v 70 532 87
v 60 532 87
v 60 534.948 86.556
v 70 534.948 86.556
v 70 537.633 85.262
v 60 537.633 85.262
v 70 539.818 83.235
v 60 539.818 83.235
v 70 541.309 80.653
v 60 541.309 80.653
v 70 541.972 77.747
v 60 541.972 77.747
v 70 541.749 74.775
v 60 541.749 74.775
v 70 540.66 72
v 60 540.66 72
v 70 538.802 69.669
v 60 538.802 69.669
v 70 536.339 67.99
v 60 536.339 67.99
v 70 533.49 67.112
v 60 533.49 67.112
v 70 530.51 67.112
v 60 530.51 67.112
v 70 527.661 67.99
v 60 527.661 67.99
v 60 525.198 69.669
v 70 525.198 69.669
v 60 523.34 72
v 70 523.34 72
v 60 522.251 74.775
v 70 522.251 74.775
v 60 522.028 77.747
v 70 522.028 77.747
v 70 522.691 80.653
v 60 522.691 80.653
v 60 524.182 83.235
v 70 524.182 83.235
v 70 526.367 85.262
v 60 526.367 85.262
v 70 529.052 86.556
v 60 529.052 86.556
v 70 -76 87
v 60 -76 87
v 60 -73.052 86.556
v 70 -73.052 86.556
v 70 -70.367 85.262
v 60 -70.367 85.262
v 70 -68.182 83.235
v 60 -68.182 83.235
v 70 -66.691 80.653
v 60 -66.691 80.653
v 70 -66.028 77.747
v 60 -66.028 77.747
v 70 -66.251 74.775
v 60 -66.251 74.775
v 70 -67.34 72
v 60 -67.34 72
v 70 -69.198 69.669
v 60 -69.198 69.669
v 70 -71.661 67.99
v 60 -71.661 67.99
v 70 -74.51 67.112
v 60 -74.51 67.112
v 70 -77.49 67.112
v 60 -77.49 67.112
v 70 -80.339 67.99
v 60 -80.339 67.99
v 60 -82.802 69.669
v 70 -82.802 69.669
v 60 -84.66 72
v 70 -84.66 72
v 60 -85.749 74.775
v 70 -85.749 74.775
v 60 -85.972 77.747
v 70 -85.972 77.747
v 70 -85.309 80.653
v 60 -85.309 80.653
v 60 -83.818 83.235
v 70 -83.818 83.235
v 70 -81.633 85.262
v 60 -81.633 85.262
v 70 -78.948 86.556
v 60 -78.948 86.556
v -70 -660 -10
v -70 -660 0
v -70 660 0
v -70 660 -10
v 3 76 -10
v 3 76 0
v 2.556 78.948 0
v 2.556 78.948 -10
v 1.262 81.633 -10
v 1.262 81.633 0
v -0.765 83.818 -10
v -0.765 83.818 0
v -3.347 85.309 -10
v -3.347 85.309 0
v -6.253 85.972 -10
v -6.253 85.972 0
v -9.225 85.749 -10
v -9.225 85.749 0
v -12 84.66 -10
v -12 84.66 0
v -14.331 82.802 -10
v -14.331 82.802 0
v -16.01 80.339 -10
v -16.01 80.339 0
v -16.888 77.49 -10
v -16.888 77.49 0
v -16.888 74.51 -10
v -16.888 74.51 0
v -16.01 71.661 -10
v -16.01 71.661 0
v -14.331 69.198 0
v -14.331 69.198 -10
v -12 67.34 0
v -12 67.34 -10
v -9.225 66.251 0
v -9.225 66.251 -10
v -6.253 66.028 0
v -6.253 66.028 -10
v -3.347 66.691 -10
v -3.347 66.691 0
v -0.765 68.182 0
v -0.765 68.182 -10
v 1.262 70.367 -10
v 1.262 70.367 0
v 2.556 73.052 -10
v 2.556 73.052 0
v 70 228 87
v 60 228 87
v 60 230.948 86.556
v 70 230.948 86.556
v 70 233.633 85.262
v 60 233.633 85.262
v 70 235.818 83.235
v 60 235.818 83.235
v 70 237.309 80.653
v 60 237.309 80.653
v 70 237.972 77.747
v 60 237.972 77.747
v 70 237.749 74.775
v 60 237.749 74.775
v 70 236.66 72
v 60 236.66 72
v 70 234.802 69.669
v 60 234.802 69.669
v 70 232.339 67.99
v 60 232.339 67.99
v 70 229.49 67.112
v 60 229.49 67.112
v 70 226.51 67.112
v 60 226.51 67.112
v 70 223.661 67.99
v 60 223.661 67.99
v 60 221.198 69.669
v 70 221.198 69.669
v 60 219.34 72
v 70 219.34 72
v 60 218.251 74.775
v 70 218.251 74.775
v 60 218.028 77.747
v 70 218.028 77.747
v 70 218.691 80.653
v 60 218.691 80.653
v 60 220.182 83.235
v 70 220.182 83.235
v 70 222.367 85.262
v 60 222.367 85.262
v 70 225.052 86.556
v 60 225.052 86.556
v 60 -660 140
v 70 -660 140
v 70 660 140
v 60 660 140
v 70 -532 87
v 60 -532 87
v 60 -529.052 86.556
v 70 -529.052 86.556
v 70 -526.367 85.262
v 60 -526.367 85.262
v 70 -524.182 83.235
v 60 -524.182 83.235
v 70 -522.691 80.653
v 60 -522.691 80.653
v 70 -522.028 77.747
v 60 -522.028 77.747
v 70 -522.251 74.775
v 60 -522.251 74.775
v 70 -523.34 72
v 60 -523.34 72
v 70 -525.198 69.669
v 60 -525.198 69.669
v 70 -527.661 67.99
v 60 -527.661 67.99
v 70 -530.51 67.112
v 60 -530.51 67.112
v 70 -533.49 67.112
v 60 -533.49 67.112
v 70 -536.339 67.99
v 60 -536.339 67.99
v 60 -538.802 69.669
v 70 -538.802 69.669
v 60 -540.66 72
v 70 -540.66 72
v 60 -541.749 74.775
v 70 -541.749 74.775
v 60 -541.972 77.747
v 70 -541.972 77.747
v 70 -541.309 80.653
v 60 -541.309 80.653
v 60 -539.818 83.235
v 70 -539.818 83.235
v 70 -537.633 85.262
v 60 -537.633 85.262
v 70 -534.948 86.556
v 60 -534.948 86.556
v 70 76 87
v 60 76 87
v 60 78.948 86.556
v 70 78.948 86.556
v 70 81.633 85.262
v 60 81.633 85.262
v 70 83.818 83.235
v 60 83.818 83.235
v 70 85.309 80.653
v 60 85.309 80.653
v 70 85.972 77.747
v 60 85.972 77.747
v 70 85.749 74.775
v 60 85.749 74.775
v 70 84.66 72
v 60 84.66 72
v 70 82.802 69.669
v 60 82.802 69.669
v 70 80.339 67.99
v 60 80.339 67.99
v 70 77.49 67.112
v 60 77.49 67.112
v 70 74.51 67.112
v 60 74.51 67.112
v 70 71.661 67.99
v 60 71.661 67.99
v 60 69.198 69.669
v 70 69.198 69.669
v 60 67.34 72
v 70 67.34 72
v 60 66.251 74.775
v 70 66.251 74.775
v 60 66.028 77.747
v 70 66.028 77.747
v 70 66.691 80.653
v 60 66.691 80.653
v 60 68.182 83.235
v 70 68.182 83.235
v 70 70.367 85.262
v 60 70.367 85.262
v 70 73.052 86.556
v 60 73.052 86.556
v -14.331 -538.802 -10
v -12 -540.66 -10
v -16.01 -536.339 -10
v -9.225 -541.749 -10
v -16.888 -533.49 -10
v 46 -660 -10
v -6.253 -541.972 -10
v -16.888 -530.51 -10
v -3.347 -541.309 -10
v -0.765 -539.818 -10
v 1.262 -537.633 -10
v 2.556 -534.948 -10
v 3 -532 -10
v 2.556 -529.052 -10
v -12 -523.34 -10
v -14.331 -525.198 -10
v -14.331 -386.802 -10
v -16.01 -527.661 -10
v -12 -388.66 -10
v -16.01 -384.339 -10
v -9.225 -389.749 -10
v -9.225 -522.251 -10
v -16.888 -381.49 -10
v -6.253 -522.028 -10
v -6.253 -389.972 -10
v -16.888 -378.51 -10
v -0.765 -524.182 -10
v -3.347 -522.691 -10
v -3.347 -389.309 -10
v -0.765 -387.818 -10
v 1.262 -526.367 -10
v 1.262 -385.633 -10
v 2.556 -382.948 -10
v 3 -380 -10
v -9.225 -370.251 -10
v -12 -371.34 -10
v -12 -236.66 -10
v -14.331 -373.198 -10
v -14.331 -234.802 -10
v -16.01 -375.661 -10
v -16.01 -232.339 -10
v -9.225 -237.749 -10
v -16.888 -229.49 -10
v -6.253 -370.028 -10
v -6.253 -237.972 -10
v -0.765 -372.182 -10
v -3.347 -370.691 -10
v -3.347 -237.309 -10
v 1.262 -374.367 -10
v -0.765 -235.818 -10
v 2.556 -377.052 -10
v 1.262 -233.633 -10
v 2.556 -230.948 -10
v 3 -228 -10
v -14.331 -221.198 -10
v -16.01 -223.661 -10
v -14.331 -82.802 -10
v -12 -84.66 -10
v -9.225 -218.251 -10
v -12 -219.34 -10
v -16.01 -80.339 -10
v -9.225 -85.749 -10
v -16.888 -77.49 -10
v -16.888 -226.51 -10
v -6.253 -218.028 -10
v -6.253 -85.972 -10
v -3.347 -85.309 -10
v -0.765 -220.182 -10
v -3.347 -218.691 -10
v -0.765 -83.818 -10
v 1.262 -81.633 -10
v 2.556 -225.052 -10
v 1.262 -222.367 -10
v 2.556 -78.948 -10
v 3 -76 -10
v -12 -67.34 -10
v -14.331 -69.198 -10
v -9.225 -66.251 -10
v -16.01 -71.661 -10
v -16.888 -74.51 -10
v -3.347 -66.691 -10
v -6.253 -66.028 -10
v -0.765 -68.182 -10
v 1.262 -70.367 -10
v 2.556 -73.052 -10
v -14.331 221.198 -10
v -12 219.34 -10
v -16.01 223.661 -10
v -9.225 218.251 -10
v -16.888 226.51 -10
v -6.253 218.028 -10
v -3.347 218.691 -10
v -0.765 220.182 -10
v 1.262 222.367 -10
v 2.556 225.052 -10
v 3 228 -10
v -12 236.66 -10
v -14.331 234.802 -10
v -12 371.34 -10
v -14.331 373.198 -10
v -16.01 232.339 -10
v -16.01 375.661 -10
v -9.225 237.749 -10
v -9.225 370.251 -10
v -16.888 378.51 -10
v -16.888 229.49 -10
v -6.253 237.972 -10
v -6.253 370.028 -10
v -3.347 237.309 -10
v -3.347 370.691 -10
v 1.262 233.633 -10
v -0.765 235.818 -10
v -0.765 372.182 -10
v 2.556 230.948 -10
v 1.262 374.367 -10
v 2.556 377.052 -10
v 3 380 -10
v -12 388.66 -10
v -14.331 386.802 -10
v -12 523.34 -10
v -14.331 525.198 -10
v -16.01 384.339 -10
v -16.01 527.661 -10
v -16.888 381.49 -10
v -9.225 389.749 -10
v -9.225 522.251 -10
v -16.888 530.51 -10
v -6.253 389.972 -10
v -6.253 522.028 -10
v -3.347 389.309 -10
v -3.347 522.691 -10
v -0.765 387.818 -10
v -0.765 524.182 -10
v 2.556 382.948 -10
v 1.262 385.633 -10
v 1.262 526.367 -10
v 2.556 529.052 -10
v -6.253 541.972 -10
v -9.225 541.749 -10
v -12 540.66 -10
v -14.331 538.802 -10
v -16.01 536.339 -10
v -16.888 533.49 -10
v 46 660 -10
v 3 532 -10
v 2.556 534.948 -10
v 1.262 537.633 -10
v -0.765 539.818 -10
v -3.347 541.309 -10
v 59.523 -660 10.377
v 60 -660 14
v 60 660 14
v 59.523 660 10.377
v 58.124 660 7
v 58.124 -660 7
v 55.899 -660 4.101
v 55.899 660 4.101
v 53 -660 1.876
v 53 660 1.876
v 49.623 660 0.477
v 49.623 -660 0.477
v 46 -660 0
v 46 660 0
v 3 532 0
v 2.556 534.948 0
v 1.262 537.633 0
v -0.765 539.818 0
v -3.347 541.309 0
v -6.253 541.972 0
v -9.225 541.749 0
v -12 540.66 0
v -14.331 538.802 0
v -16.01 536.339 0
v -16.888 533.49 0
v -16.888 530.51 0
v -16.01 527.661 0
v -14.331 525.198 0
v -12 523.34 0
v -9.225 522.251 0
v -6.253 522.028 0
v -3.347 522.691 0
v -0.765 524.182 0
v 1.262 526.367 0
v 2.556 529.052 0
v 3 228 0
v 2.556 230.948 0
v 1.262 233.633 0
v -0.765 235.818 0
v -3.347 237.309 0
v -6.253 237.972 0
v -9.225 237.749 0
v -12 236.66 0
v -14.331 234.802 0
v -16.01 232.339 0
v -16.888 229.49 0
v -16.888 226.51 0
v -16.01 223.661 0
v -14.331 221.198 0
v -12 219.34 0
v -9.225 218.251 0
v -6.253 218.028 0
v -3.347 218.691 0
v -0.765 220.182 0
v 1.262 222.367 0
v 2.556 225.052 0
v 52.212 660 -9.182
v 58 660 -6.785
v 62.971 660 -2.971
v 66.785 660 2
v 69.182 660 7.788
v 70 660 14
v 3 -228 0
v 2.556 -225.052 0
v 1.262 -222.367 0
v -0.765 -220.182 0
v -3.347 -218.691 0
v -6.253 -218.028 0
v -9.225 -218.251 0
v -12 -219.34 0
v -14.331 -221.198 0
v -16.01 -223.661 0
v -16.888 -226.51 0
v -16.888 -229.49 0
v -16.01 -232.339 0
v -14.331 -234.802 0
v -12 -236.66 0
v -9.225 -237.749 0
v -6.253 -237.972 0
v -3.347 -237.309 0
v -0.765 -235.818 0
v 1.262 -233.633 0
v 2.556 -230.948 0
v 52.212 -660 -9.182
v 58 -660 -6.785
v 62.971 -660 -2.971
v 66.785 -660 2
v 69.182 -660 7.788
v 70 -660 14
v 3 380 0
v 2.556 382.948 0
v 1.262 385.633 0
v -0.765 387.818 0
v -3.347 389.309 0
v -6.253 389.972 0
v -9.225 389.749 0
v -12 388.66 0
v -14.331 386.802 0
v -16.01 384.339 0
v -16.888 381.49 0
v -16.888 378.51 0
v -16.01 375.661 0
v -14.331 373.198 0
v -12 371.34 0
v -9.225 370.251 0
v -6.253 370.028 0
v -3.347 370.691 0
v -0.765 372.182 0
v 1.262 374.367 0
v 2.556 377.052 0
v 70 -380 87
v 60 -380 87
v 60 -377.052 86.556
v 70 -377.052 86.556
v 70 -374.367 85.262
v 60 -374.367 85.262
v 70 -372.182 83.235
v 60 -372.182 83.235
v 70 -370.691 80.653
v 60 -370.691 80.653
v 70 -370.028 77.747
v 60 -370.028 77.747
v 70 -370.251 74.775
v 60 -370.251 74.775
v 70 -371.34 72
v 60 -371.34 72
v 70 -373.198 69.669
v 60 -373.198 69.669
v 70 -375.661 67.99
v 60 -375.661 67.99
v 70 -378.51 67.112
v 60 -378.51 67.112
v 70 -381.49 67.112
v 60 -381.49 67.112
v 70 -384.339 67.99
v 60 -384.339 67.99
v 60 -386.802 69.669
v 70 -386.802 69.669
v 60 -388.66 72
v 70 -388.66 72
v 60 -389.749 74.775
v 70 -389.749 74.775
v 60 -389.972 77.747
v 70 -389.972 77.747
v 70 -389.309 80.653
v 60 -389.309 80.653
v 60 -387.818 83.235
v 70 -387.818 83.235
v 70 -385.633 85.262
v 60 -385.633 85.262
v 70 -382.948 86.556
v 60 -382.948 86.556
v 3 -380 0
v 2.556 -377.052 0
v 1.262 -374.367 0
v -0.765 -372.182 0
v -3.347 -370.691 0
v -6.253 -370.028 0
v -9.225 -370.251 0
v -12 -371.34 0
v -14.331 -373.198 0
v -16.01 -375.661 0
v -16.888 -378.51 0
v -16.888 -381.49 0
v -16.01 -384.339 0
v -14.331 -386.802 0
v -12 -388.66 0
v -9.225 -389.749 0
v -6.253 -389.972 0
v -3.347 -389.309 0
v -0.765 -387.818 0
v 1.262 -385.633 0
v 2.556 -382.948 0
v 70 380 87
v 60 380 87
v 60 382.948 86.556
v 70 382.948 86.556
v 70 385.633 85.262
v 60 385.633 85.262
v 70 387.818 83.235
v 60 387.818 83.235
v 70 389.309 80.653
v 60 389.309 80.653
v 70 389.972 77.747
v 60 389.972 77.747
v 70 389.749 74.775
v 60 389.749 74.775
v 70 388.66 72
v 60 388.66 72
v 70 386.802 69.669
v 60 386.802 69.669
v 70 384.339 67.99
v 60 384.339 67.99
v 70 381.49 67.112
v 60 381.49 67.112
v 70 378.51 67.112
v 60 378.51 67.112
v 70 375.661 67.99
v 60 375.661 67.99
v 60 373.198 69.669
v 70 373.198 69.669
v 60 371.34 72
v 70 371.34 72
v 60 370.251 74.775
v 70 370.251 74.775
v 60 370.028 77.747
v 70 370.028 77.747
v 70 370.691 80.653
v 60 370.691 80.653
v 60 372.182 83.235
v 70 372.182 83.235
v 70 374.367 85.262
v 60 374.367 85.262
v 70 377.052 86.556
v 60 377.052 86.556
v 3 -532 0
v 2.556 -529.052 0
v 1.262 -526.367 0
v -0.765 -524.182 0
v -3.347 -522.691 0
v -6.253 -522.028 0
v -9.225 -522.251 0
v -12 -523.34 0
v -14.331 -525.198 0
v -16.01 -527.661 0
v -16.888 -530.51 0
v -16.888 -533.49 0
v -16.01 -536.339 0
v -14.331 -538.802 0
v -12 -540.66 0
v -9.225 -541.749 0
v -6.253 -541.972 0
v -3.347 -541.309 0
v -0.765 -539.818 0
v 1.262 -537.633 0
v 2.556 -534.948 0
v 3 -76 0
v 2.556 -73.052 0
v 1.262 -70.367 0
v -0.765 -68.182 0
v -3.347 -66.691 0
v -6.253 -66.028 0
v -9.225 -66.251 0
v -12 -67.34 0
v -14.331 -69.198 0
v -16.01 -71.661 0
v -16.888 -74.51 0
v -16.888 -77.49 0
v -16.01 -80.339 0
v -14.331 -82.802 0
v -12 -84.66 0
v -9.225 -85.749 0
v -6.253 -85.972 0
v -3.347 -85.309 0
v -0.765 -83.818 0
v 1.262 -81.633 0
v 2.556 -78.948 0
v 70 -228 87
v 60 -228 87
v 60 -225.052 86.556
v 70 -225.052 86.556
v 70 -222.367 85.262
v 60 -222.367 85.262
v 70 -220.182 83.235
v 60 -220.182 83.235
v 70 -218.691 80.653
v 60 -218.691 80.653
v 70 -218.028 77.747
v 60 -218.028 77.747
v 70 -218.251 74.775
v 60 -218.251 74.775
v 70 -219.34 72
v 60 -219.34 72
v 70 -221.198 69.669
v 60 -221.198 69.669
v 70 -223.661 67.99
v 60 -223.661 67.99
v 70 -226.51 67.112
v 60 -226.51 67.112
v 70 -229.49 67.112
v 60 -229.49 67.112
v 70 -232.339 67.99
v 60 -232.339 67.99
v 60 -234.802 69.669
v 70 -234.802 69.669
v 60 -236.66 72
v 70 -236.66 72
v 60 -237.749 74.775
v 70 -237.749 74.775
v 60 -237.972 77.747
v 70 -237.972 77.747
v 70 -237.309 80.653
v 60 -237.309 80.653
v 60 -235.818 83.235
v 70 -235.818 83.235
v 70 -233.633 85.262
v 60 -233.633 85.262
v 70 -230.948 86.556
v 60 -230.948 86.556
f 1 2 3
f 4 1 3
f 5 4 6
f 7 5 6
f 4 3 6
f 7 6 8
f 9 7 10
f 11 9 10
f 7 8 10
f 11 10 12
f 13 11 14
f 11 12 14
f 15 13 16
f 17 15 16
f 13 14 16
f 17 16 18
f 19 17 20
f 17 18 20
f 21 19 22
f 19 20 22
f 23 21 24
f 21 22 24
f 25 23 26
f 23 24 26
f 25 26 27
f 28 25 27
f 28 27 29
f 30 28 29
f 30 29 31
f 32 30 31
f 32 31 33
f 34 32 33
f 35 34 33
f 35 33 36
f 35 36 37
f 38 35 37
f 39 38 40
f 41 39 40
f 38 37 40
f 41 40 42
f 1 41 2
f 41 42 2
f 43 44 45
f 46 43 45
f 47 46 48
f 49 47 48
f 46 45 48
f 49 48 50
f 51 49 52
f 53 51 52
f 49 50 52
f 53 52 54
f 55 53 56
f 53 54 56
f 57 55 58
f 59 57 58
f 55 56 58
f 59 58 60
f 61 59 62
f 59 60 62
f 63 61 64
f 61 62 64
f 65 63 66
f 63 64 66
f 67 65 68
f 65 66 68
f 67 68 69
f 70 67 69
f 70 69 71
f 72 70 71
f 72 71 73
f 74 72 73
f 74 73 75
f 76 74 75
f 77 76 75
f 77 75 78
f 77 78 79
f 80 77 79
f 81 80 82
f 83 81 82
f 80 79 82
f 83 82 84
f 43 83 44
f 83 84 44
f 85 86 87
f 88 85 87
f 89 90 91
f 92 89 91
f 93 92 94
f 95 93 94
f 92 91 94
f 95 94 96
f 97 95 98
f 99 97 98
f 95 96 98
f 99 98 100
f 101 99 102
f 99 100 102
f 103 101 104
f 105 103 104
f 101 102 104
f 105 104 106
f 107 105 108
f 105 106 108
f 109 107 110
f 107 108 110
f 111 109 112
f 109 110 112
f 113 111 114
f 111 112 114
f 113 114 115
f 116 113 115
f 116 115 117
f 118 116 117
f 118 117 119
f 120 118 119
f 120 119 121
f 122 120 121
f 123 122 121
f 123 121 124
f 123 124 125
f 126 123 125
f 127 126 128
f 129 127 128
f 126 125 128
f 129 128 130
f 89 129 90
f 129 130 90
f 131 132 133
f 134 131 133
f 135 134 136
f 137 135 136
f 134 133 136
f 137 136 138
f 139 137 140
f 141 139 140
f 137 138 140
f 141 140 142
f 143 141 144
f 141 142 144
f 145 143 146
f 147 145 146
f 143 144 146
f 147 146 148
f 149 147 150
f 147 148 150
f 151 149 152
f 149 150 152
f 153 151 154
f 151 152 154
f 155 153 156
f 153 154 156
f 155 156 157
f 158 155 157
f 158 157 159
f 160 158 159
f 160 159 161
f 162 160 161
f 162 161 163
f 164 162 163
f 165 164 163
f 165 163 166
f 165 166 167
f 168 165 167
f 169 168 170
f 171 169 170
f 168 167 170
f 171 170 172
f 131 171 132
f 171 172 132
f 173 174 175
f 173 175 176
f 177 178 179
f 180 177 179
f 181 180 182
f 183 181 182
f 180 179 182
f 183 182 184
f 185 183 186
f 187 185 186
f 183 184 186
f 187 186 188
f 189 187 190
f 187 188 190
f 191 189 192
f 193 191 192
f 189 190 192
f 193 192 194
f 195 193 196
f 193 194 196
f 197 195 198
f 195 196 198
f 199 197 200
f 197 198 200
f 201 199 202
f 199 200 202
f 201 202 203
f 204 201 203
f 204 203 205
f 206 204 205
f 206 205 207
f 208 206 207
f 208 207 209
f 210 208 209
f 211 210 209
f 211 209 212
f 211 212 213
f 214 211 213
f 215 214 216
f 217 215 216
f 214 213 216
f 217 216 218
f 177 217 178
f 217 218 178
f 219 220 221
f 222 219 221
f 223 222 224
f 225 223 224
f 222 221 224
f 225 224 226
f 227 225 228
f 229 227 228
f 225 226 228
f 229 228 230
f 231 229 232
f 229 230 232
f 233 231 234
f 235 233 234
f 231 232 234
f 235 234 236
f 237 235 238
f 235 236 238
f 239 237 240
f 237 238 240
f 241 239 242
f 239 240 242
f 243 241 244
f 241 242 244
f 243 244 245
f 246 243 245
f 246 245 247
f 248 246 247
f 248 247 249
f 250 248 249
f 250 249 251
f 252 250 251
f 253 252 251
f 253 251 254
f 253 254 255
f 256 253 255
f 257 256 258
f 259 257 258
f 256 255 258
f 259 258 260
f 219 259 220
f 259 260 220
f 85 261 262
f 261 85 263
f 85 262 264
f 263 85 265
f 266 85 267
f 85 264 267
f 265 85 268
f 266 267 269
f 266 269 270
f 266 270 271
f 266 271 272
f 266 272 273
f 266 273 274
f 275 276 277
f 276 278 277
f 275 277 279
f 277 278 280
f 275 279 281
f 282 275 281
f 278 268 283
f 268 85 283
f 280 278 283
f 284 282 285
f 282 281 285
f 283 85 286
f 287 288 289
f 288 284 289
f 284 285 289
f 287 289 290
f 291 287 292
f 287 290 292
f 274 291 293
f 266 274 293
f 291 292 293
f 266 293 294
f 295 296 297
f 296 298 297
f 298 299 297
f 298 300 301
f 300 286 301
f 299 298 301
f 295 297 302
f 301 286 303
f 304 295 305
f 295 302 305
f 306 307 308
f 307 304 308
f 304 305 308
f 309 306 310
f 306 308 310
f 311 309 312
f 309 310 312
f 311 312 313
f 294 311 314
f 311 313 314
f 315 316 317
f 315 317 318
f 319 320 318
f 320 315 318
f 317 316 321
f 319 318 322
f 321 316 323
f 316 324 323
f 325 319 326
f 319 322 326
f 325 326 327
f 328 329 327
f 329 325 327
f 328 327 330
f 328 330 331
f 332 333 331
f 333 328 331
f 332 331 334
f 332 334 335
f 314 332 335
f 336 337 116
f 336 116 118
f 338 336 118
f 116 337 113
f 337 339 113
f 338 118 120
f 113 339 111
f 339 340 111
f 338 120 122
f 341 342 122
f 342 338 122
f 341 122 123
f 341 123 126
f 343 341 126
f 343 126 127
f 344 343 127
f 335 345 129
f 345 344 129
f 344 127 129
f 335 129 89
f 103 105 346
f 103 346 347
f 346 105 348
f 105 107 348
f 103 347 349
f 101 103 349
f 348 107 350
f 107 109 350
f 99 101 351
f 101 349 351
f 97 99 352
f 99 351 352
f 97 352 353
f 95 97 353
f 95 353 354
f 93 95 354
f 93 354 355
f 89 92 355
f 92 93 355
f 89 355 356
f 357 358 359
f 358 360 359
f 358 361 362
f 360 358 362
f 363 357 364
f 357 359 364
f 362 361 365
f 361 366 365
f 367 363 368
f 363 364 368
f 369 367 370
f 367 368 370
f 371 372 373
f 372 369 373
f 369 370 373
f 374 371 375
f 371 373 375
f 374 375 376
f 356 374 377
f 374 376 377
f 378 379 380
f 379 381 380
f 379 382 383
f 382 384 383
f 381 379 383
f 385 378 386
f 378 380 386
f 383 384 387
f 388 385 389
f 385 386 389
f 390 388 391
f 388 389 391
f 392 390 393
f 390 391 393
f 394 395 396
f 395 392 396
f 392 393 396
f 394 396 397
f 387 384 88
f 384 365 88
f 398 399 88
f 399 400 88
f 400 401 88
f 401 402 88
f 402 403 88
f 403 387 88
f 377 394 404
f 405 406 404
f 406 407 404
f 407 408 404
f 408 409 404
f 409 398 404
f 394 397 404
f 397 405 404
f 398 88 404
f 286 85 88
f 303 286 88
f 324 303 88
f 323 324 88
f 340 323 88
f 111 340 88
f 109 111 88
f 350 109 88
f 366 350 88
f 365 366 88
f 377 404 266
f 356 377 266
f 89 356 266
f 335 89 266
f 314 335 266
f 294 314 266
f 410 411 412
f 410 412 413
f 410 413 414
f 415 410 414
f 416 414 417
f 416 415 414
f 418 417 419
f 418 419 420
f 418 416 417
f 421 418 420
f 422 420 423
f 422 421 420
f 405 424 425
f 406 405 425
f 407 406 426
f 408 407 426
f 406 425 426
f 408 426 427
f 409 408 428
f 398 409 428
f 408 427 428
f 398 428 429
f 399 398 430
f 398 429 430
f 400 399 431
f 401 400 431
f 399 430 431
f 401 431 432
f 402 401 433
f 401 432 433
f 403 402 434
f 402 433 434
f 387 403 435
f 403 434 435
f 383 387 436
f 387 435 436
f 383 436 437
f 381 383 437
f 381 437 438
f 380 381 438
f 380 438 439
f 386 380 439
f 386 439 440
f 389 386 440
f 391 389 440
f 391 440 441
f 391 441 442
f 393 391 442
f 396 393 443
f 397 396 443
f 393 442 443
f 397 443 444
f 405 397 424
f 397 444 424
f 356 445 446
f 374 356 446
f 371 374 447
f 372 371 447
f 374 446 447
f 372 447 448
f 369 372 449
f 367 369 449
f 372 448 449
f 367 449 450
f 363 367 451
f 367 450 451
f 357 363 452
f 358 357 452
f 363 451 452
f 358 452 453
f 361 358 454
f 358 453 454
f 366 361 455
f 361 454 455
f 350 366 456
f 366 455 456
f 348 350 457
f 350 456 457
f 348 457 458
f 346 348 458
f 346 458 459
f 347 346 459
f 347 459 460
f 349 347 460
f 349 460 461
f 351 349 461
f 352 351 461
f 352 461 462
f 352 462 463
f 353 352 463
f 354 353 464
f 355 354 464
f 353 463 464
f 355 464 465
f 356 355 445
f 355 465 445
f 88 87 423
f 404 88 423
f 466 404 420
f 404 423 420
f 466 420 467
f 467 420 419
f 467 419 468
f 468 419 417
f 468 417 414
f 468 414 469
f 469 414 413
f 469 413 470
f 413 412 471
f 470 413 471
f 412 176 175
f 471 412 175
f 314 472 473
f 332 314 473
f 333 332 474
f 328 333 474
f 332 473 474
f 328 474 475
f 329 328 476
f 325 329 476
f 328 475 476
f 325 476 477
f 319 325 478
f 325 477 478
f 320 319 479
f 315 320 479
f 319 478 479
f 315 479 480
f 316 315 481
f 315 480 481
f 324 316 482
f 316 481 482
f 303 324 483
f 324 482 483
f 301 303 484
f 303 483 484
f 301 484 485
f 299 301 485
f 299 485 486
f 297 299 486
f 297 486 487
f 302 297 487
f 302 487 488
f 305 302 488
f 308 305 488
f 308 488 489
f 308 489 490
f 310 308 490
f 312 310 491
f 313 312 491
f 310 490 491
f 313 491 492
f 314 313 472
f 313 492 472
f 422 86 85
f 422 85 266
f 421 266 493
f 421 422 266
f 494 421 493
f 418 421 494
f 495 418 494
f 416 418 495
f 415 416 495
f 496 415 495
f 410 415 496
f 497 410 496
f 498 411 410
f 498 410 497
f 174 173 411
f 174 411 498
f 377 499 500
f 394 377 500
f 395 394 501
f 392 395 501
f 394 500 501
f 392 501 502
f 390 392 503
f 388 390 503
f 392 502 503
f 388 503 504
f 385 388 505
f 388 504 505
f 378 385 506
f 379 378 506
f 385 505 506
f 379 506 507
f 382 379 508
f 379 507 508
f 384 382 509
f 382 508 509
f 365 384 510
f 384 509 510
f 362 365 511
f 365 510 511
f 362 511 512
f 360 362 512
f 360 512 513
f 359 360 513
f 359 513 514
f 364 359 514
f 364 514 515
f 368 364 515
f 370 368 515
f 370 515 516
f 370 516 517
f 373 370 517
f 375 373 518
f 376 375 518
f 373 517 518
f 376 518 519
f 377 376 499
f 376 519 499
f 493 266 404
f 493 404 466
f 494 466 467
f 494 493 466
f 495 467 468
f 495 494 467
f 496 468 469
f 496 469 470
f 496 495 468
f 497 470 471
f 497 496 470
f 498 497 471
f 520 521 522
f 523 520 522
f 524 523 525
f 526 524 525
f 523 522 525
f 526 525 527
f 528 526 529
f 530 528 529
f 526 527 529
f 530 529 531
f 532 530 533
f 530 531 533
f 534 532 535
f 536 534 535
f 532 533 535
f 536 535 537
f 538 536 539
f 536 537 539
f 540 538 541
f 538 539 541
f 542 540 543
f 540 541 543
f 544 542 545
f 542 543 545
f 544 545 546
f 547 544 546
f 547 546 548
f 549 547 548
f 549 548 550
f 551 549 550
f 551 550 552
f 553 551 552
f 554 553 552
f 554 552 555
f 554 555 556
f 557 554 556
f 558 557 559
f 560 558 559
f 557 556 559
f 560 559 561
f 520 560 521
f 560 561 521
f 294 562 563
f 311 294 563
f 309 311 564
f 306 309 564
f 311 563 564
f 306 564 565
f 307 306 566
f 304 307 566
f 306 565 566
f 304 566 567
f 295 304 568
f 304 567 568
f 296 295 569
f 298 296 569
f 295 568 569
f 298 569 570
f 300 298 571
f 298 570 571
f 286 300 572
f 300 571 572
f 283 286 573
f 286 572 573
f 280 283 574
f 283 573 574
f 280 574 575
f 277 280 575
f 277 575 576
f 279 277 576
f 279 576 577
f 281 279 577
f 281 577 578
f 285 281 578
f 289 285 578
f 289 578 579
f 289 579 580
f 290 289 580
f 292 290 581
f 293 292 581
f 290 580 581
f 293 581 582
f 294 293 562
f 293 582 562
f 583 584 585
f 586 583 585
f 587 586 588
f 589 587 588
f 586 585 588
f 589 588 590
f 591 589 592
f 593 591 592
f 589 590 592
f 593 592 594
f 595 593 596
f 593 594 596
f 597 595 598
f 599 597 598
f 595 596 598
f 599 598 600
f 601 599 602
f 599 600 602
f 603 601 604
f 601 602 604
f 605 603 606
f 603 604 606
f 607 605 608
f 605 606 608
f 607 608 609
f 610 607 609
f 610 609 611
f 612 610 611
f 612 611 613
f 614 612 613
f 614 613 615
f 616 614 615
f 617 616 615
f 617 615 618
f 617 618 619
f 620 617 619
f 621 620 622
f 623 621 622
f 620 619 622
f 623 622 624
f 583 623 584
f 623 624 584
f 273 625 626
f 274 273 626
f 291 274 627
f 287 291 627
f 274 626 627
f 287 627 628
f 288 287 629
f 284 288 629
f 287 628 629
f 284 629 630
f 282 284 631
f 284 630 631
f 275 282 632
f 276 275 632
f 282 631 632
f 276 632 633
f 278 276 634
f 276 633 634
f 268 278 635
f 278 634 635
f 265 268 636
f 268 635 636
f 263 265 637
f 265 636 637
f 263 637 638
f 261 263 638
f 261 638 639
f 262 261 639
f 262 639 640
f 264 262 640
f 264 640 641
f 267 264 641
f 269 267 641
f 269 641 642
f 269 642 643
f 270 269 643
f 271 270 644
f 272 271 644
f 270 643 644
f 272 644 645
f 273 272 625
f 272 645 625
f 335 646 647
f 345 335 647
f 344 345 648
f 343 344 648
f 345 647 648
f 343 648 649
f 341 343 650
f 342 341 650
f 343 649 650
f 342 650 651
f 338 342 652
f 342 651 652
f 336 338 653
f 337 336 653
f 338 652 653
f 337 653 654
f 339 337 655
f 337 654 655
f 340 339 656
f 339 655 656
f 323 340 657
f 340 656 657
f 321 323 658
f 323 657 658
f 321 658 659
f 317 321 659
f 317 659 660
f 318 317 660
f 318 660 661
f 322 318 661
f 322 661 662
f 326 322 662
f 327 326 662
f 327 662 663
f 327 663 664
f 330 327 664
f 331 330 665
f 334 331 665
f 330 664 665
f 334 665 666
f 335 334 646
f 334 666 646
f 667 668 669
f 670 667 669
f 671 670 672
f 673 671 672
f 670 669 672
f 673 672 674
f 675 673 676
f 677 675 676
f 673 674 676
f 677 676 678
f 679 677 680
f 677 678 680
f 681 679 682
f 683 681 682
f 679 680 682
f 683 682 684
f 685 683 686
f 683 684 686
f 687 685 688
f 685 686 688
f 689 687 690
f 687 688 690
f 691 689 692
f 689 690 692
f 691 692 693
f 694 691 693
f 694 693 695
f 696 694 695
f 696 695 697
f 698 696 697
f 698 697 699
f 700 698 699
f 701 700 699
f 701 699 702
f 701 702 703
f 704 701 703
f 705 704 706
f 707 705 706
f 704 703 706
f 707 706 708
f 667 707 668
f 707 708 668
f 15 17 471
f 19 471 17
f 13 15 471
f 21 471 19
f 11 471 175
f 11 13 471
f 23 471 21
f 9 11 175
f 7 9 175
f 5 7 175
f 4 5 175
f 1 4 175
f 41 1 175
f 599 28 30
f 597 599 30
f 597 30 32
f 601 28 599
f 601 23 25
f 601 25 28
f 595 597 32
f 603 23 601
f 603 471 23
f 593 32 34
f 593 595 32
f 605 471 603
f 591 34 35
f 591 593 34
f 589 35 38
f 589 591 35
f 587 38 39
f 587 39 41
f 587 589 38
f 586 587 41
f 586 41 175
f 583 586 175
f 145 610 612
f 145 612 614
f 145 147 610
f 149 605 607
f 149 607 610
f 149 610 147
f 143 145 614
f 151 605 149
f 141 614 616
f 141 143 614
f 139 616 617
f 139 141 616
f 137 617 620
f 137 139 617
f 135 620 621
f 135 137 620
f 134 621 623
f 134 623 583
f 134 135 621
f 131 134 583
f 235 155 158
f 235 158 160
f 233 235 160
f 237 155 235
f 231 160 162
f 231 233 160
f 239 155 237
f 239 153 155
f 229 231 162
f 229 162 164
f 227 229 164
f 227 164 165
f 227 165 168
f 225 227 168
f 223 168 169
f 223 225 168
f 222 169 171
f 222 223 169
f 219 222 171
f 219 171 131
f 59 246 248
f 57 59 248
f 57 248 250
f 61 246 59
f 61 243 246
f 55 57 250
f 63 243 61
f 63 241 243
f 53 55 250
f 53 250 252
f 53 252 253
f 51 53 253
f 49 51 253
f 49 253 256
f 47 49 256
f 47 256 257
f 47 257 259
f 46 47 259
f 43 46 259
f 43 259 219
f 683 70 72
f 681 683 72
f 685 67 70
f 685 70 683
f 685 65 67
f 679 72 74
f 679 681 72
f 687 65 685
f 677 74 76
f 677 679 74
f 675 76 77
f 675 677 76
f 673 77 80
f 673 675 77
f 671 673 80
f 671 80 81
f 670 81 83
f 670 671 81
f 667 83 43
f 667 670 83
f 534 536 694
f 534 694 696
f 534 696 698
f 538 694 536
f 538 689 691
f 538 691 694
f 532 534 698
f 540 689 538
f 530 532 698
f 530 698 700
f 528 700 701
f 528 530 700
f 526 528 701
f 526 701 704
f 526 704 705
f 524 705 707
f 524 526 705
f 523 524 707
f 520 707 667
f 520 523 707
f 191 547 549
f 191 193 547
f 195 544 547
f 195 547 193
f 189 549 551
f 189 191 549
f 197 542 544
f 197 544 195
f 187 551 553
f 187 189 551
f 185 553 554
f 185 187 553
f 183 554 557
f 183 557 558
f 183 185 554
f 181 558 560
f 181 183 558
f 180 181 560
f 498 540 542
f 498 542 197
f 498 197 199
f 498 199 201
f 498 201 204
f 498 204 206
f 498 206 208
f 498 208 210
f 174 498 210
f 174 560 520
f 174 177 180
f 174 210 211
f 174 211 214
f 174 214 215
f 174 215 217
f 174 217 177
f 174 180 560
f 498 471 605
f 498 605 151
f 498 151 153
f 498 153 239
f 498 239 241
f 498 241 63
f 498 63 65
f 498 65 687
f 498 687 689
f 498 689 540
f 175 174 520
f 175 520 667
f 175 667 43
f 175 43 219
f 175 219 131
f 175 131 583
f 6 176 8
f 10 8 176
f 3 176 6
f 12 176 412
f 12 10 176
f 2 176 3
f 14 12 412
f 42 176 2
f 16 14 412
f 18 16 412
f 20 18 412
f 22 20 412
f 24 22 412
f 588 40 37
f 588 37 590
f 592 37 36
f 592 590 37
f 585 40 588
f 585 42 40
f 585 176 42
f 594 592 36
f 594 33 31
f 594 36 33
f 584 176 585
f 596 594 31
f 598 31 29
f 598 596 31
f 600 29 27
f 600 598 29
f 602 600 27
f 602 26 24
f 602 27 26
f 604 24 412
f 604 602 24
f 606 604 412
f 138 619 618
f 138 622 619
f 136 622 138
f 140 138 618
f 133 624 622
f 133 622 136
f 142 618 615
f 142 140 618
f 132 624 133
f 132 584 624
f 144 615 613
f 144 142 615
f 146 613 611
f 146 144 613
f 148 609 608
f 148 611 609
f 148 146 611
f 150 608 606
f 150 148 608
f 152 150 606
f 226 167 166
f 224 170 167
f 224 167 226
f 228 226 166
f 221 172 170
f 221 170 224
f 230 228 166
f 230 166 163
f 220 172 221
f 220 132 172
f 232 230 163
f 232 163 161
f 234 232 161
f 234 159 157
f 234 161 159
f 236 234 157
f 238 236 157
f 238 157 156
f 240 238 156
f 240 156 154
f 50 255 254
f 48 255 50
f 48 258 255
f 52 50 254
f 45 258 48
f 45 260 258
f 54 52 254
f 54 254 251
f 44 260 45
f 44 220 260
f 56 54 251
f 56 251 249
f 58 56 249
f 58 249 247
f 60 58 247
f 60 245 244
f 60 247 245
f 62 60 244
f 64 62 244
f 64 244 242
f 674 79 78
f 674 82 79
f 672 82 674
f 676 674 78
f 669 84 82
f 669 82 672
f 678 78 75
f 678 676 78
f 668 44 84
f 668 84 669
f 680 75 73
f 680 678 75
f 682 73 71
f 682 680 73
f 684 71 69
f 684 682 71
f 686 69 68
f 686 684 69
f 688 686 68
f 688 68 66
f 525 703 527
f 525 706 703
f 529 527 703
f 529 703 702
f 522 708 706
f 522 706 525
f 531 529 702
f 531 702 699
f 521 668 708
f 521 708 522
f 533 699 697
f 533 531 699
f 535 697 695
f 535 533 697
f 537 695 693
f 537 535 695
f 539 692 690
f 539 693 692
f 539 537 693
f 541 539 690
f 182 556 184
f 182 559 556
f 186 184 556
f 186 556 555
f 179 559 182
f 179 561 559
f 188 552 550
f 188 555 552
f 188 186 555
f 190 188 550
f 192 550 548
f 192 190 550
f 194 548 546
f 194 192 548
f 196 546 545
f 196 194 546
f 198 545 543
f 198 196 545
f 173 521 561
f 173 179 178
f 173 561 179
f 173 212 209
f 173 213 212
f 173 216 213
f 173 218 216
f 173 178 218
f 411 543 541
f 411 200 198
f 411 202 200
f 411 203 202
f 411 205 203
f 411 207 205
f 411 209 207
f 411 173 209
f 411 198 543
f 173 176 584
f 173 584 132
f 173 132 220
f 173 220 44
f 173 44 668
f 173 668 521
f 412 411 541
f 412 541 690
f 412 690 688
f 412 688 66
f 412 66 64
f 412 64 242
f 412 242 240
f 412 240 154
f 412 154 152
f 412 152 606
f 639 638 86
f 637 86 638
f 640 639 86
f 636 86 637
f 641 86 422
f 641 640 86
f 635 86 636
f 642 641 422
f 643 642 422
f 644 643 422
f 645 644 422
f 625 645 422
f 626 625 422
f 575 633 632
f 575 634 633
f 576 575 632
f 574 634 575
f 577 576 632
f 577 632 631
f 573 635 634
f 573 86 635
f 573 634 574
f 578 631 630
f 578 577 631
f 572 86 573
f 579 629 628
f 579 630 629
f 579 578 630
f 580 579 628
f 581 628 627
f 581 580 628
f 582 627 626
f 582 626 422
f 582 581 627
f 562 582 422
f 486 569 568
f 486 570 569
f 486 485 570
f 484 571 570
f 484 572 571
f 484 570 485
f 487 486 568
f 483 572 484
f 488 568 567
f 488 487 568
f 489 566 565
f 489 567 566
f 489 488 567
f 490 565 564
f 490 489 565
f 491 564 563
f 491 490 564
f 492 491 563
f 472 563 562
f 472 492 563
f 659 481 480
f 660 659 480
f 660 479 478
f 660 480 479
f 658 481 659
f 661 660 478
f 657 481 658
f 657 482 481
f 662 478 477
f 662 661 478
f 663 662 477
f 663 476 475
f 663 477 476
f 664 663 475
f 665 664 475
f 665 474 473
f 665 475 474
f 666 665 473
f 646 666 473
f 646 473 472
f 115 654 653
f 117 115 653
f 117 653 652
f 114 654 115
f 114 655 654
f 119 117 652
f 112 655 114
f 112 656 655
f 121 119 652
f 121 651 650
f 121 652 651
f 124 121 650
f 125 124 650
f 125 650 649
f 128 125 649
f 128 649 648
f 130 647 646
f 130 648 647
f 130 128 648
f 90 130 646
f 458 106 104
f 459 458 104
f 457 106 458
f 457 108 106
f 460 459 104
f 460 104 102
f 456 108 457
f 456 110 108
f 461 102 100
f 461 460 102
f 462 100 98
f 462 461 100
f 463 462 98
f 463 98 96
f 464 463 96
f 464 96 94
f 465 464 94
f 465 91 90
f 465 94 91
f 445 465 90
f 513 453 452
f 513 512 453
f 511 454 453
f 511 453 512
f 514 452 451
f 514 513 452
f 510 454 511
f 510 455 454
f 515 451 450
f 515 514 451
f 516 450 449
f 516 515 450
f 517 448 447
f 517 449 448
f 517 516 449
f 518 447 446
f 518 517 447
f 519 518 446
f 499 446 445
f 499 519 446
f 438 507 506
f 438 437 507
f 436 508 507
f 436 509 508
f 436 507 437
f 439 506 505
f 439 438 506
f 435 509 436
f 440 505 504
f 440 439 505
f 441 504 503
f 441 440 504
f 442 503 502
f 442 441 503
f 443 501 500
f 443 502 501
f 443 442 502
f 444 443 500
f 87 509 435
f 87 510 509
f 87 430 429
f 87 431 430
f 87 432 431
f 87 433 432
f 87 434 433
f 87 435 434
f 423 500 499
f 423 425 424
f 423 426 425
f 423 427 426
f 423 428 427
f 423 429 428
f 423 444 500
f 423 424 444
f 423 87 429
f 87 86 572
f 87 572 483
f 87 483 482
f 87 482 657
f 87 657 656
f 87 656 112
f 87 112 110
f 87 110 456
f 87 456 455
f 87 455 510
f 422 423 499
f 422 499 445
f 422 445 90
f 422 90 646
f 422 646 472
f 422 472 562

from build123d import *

# Parameters (mm, degrees)
SKETCH1_W                    = 140
SKETCH1_H                    = 1320
BASE_FLANGE1_DEPTH           = 10
EDGE_FLANGE1_STRIP_W         = 68
EDGE_FLANGE1_STRIP_H         = 10
EDGE_FLANGE1_STRIP_CUT_DEPTH = 1320
EDGE_FLANGE1_DEPTH           = 1320
SKETCH12_R                   = 10
CUT_EXTRUDE1_DEPTH           = 10
SKETCH13_R                   = 10
CUT_EXTRUDE2_DEPTH           = 10
LPATTERN1_COUNT              = 8
LPATTERN1_PITCH              = 152


# Sheet-metal steps are written as plain solids
with BuildPart() as part:
    # Sketch1 → Base-Flange1 (new body)
    with BuildSketch(Plane.XY):
        Rectangle(SKETCH1_W, SKETCH1_H)
    extrude(amount=-BASE_FLANGE1_DEPTH)

    # Edge-Flange1 strip (across the edge) → Edge-Flange1 strip cut (cut)
    with BuildSketch(Plane(origin=(70, -660, 0), x_dir=(-1, 0, 0), z_dir=(0, 1, 0))):
        with Locations((-10, -5)):
            Rectangle(EDGE_FLANGE1_STRIP_W, EDGE_FLANGE1_STRIP_H)
    extrude(amount=EDGE_FLANGE1_STRIP_CUT_DEPTH, mode=Mode.SUBTRACT)

    # Edge-Flange1 section (across the edge) → Edge-Flange1 (add)
    with BuildSketch(Plane(origin=(70, -660, 0), x_dir=(-1, 0, 0), z_dir=(0, 1, 0))):
        with BuildLine():
            Line((0, 14), (0, 140))
            Line((0, 140), (10, 140))
            Line((10, 140), (10, 14))
            ThreePointArc((10, 14), (14.100505063, 4.100505063), (24, 0))
            Line((24, 0), (24, -10))
            ThreePointArc((24, -10), (7.029437252, -2.970562748), (0, 14))
        make_face()
    extrude(amount=EDGE_FLANGE1_DEPTH)

    # Sketch12 → Cut-Extrude1 (cut)
    with BuildSketch(Plane.ZY.offset(-60)):
        with Locations((77, 532)):
            Circle(SKETCH12_R)
    cut_extrude1 = extrude(amount=-CUT_EXTRUDE1_DEPTH, mode=Mode.SUBTRACT)

    # Sketch13 → Cut-Extrude2 (cut)
    with BuildSketch(Plane.XY):
        with Locations((-7, 532)):
            Circle(SKETCH13_R)
    cut_extrude2 = extrude(amount=-CUT_EXTRUDE2_DEPTH, mode=Mode.SUBTRACT)

    # LPattern1: Cut-Extrude1, Cut-Extrude2 ×8
    with Locations(*[(0, -i * LPATTERN1_PITCH, 0) for i in range(1, LPATTERN1_COUNT)]):
        add(cut_extrude1, mode=Mode.SUBTRACT)
        add(cut_extrude2, mode=Mode.SUBTRACT)


solid = part.part
